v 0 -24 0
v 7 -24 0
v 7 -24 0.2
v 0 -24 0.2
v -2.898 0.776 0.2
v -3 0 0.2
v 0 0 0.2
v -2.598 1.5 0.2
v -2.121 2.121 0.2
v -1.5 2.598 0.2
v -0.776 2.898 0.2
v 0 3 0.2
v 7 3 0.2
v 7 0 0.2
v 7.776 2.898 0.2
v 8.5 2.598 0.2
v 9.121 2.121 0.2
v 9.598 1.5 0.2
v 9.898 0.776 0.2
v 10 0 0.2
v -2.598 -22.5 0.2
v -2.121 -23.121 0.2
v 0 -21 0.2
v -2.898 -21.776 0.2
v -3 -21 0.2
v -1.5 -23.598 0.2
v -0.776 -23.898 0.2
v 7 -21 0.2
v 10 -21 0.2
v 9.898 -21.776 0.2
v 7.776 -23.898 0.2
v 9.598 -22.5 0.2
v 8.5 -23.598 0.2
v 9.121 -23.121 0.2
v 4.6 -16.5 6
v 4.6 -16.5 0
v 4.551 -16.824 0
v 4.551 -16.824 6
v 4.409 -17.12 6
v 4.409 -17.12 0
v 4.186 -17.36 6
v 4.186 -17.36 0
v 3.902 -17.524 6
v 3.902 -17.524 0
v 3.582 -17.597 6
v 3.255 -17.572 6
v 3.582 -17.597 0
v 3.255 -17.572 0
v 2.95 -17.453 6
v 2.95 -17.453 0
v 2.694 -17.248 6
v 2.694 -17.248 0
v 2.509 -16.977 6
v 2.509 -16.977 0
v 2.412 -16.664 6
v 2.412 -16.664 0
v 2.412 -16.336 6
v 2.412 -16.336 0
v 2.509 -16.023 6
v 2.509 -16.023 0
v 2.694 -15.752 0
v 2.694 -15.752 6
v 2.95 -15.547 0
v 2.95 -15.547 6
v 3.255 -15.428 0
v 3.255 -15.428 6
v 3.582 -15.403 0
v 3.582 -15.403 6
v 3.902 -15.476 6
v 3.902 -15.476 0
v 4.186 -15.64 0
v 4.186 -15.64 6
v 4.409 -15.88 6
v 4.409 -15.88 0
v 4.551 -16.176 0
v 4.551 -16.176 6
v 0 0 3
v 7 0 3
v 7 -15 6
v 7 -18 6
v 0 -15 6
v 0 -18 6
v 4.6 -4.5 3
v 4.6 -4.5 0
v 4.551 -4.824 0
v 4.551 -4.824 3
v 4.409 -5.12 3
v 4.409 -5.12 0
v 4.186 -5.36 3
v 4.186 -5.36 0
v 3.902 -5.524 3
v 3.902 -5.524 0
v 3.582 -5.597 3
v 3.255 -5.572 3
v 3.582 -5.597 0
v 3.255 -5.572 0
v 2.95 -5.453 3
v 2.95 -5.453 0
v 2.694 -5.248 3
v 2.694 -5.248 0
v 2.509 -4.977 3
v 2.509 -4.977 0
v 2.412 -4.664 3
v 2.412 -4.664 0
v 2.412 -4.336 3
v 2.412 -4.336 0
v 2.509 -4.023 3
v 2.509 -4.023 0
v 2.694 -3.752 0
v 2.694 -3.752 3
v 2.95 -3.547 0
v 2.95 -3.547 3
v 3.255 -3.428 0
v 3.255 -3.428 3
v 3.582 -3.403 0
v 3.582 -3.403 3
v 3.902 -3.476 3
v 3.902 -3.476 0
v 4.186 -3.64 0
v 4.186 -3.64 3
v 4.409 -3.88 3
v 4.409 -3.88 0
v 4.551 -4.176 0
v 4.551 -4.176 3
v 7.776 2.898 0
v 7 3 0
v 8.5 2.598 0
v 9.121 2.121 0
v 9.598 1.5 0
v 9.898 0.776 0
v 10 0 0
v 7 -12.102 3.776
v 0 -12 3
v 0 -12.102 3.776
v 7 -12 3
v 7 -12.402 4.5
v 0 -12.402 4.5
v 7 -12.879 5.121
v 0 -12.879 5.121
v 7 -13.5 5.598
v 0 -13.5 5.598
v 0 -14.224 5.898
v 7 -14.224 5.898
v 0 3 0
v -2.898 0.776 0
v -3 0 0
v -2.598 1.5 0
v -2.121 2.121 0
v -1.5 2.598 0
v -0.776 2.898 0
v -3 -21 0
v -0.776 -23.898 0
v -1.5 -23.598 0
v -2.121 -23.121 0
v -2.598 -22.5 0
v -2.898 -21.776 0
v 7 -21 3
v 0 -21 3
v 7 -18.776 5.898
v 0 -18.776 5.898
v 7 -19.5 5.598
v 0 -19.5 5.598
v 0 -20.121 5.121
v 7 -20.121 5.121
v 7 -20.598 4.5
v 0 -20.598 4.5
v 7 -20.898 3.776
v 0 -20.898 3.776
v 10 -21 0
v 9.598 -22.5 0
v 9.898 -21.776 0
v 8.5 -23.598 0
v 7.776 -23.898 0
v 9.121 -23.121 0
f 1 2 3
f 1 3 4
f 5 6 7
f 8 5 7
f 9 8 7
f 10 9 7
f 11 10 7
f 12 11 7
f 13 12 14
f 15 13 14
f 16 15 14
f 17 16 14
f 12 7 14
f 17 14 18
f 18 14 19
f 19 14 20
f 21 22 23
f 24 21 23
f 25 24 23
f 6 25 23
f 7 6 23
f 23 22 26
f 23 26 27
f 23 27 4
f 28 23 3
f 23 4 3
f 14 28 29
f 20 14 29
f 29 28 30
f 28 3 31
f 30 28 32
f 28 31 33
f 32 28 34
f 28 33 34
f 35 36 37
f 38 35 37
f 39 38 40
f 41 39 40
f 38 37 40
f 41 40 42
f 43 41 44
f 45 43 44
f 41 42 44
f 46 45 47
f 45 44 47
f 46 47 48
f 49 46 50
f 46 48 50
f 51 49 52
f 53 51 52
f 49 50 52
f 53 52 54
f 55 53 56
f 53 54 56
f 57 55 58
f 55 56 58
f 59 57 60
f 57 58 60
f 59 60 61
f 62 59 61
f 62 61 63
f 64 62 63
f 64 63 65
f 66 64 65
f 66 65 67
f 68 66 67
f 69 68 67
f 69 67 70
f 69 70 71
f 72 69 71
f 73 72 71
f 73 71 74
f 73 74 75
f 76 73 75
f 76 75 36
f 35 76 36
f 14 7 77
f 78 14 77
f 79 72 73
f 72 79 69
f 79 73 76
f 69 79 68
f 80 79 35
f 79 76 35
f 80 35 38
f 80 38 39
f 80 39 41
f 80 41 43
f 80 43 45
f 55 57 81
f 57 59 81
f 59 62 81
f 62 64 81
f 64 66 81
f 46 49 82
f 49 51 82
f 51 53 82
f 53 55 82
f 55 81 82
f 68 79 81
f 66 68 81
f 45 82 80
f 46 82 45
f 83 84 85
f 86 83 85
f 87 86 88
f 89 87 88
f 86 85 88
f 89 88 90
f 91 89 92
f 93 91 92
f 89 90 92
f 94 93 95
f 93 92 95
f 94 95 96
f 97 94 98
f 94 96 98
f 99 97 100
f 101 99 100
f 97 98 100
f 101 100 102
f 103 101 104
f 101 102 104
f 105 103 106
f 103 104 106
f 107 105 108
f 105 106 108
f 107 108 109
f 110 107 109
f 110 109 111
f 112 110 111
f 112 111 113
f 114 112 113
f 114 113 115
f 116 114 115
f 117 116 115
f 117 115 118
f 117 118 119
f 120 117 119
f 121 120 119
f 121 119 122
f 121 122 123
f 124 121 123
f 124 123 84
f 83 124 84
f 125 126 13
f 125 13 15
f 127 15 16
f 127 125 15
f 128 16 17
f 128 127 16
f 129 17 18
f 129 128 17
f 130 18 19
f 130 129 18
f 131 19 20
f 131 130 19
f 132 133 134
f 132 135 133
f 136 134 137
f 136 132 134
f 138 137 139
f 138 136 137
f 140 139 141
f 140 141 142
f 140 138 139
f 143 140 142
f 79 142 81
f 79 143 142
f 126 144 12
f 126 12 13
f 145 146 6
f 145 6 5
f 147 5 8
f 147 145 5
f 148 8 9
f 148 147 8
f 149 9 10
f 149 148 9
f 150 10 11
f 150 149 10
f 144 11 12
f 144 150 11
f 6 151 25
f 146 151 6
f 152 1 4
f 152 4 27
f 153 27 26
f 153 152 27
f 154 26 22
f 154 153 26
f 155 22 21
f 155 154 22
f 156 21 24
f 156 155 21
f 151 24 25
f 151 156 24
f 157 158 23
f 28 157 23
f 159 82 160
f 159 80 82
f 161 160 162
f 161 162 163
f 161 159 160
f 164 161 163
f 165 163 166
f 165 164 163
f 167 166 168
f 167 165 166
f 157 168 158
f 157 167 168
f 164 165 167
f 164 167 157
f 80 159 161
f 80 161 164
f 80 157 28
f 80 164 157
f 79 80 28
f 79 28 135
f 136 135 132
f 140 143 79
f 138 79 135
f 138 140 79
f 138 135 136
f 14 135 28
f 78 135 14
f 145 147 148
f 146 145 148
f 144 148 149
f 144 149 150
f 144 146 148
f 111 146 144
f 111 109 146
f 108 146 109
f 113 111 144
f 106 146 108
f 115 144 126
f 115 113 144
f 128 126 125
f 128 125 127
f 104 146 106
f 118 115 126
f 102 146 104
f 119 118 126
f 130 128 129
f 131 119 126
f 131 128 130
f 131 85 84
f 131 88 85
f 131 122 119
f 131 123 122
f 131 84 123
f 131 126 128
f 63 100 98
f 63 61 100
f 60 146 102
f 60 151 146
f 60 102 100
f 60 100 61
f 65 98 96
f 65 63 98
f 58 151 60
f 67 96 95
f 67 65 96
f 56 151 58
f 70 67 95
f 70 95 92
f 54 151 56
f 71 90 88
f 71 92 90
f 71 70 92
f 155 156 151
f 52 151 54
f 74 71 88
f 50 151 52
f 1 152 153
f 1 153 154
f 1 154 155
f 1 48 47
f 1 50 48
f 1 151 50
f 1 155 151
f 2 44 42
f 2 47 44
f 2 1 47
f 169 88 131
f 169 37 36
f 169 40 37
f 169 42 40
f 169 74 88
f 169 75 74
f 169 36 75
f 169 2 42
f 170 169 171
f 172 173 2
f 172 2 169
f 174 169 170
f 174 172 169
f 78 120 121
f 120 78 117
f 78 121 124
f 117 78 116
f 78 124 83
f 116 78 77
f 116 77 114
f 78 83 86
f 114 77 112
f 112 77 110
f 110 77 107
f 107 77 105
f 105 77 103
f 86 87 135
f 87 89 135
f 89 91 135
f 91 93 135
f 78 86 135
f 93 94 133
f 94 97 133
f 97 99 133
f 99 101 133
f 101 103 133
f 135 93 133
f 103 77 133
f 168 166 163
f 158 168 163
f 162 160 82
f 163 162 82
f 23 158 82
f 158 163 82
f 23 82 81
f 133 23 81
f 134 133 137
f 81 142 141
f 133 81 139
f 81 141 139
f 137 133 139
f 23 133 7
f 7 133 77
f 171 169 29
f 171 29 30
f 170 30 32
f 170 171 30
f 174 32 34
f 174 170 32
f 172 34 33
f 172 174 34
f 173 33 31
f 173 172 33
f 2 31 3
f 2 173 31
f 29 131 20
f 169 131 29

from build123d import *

# Parameters (mm, degrees)
F1_DEPTH = 7
F2_R     = 2.99999
F3_R     = 1.1
F4_DEPTH = 6.001
F5_W     = 7
F5_H     = 21
F6_DEPTH = 0.2


# Not quite as in the source:
# - a fillet or chamfer is up to 0.001 mm smaller than in the source, because OpenCascade refuses the exact size


with BuildPart() as f1:
    # F0 (on Right) → F1 (new body)
    with BuildSketch(Plane.YZ):
        Polygon((-21, 0), (0, 0), (0, 3), (-12, 3), (-12, 6), (-21, 6), align=None)
    extrude(amount=F1_DEPTH)

    # F2 (radius 3 in the source; OpenCascade refuses exactly that, so slightly less here)
    f2_edges = [f1.edges().sort_by_distance(p)[0] for p in [
        (3.5, -12, 6),
        (3.5, -21, 6),
    ]]
    fillet(f2_edges, radius=F2_R)

    # F3 (on face) → F4 (cut, through all)
    with BuildSketch(Plane(origin=(0, 0, 0), x_dir=(1, 0, 0), z_dir=(0, 0, -1))):
        with Locations((3.5, 16.5)):
            Circle(F3_R)
        with Locations((3.5, 4.5)):
            Circle(F3_R)
    extrude(amount=-F4_DEPTH, mode=Mode.SUBTRACT)

    # F5 (on face) → F6 (join)
    with BuildSketch(Plane(origin=(0, 0, 0), x_dir=(1, 0, 0), z_dir=(0, 0, -1))):
        with BuildLine():
            ThreePointArc((0, 24), (-2.1213203436, 23.1213203436), (-3, 21))
            Line((-3, 21), (-3, 0))
            ThreePointArc((-3, 0), (-2.1213203436, -2.1213203436), (0, -3))
            Line((0, -3), (7, -3))
            ThreePointArc((7, -3), (9.1213203436, -2.1213203436), (10, 0))
            Line((10, 0), (10, 21))
            ThreePointArc((10, 21), (9.1213203436, 23.1213203436), (7, 24))
            Line((7, 24), (0, 24))
        make_face()
        with Locations((3.5, 10.5)):
            Rectangle(F5_W, F5_H, mode=Mode.SUBTRACT)
    extrude(amount=-F6_DEPTH)


solid = f1.part
